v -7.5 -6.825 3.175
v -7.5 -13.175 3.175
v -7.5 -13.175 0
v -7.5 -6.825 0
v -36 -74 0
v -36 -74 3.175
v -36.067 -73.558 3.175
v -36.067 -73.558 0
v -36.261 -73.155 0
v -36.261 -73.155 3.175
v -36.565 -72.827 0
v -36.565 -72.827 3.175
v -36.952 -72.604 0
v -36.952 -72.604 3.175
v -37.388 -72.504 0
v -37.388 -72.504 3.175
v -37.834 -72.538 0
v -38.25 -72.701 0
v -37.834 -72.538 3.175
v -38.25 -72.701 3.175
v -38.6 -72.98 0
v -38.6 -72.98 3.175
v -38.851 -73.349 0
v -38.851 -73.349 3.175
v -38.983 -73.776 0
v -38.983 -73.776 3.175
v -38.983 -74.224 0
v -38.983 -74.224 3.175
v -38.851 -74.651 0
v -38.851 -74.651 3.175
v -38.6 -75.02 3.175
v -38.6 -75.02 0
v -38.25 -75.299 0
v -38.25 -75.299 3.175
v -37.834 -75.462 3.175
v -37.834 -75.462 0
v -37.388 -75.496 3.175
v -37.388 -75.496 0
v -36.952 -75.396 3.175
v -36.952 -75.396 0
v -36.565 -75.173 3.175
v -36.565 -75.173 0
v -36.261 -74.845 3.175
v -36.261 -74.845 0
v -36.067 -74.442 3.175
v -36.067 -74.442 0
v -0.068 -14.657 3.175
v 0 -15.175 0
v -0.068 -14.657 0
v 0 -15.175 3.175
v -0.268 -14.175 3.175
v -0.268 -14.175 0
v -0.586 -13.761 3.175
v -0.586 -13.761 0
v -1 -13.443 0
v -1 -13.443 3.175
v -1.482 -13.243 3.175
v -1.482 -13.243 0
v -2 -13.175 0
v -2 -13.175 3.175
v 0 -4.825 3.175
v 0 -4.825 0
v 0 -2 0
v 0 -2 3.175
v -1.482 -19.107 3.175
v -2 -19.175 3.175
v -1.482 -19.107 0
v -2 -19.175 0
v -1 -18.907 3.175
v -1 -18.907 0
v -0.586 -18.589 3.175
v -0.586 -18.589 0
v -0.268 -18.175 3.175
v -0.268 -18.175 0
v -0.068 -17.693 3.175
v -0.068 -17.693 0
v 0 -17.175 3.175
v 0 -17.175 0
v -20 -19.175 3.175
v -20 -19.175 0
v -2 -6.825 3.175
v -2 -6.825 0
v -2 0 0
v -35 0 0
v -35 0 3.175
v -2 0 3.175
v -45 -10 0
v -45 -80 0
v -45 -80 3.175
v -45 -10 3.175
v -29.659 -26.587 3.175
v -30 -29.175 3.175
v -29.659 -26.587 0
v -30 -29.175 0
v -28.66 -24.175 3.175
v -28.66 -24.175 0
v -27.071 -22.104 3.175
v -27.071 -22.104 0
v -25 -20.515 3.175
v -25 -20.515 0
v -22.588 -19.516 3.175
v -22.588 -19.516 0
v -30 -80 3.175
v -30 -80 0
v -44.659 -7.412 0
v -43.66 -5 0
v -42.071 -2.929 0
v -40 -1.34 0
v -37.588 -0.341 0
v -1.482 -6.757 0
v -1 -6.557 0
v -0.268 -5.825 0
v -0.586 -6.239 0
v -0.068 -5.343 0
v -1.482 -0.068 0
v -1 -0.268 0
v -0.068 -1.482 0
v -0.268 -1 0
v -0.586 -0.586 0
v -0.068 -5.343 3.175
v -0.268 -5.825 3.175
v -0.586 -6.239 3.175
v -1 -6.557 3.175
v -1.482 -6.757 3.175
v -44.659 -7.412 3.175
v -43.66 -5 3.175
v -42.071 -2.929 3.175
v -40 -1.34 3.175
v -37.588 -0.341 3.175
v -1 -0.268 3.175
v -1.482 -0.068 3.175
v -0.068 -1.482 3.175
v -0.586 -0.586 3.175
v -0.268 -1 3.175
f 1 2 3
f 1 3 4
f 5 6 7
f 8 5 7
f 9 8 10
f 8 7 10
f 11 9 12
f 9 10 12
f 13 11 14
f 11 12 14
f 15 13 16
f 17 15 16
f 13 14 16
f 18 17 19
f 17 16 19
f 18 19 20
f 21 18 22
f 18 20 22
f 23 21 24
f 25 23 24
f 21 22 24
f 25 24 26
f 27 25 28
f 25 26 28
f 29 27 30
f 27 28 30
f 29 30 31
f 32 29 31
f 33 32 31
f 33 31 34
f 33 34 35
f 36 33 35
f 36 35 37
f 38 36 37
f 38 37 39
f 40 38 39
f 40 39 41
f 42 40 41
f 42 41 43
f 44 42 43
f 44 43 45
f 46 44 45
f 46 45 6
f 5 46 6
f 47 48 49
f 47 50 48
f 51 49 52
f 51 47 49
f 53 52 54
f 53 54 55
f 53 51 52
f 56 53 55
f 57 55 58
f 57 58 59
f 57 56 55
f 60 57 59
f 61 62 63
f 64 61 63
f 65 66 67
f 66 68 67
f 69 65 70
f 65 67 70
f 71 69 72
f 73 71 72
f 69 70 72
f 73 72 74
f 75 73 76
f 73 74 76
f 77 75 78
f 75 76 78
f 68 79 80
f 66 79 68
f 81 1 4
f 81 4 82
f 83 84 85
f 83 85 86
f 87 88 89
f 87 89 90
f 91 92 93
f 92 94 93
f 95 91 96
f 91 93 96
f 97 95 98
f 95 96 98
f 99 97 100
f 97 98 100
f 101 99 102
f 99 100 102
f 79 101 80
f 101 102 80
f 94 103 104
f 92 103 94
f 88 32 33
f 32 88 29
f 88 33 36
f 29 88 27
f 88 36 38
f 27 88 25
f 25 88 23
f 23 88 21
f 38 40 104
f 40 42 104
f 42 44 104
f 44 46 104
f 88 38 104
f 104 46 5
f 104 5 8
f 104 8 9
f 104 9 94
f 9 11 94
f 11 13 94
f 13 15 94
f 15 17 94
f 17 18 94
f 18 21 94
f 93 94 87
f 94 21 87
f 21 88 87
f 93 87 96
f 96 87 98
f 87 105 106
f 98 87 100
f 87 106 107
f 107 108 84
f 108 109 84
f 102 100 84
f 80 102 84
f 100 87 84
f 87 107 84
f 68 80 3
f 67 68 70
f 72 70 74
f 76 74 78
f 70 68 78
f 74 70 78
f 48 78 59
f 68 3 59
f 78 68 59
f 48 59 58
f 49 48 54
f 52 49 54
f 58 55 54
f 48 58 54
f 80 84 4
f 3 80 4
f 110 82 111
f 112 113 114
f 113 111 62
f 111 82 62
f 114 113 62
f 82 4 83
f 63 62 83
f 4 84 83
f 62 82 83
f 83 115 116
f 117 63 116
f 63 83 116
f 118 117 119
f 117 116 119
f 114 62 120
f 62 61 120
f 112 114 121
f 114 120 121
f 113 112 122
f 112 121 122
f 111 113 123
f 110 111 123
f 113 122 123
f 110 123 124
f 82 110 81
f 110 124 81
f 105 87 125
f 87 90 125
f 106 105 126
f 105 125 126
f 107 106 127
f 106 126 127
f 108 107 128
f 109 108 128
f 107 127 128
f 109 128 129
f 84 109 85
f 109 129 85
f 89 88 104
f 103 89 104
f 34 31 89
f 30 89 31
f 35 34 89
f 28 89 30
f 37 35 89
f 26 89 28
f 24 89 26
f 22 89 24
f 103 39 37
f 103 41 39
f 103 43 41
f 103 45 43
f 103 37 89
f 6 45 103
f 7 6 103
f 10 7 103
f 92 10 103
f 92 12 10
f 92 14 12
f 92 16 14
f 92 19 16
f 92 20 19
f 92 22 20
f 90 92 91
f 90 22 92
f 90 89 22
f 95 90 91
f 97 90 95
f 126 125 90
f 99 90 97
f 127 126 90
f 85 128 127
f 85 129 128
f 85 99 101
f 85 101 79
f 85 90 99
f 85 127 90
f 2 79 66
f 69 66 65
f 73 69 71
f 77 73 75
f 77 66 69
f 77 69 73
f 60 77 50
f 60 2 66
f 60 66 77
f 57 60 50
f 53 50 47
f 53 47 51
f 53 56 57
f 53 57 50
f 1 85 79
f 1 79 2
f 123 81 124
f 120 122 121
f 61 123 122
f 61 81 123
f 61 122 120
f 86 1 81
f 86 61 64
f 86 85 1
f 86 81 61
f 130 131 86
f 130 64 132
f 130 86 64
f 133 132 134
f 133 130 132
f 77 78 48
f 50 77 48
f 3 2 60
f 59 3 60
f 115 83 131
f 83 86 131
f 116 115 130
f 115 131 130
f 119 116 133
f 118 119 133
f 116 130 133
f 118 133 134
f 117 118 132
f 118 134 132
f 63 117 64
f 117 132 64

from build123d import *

# Parameters (mm, degrees)
SKETCH1_W           = 45
SKETCH1_H           = 80
BOSS_EXTRUDE1_DEPTH = 3.175
SKETCH2_W           = 15
SKETCH2_H           = 6.35
CUT_EXTRUDE1_DEPTH  = 92.842695001
SKETCH3_R           = 1.5
SKETCH3_W           = 30
SKETCH3_H           = 60.825
CUT_EXTRUDE2_DEPTH  = 92.842695001
FILLET1_R           = 10
FILLET2_R           = 2


with BuildPart() as part:
    # Sketch1 → Boss-Extrude1 (new body)
    with BuildSketch(Plane.XY):
        with Locations((-22.5, -40)):
            Rectangle(SKETCH1_W, SKETCH1_H)
    extrude(amount=BOSS_EXTRUDE1_DEPTH)

    # Sketch2 → Cut-Extrude1 (cut, through all)
    with BuildSketch(Plane.XY.offset(3.175)):
        with Locations((0, -10)):
            Rectangle(SKETCH2_W, SKETCH2_H)
    extrude(amount=-CUT_EXTRUDE1_DEPTH, mode=Mode.SUBTRACT)

    # Sketch3 → Cut-Extrude2 (cut, through all)
    with BuildSketch(Plane.XY.offset(3.175)):
        with Locations((-37.5, -74)):
            Circle(SKETCH3_R)
        with Locations((-15, -49.5875)):
            Rectangle(SKETCH3_W, SKETCH3_H)
    extrude(amount=-CUT_EXTRUDE2_DEPTH, mode=Mode.SUBTRACT)

    # Fillet1
    fillet1_edges = [part.edges().sort_by_distance(p)[0] for p in [
        (-30, -19.175, 1.5875),
        (-45, 0, 1.5875),
    ]]
    fillet(fillet1_edges, radius=FILLET1_R)

    # Fillet2
    fillet2_edges = [part.edges().sort_by_distance(p)[0] for p in [
        (0, -13.175, 1.5875),
        (0, -6.825, 1.5875),
        (0, -19.175, 1.5875),
        (0, 0, 1.5875),
    ]]
    fillet(fillet2_edges, radius=FILLET2_R)


solid = part.part
